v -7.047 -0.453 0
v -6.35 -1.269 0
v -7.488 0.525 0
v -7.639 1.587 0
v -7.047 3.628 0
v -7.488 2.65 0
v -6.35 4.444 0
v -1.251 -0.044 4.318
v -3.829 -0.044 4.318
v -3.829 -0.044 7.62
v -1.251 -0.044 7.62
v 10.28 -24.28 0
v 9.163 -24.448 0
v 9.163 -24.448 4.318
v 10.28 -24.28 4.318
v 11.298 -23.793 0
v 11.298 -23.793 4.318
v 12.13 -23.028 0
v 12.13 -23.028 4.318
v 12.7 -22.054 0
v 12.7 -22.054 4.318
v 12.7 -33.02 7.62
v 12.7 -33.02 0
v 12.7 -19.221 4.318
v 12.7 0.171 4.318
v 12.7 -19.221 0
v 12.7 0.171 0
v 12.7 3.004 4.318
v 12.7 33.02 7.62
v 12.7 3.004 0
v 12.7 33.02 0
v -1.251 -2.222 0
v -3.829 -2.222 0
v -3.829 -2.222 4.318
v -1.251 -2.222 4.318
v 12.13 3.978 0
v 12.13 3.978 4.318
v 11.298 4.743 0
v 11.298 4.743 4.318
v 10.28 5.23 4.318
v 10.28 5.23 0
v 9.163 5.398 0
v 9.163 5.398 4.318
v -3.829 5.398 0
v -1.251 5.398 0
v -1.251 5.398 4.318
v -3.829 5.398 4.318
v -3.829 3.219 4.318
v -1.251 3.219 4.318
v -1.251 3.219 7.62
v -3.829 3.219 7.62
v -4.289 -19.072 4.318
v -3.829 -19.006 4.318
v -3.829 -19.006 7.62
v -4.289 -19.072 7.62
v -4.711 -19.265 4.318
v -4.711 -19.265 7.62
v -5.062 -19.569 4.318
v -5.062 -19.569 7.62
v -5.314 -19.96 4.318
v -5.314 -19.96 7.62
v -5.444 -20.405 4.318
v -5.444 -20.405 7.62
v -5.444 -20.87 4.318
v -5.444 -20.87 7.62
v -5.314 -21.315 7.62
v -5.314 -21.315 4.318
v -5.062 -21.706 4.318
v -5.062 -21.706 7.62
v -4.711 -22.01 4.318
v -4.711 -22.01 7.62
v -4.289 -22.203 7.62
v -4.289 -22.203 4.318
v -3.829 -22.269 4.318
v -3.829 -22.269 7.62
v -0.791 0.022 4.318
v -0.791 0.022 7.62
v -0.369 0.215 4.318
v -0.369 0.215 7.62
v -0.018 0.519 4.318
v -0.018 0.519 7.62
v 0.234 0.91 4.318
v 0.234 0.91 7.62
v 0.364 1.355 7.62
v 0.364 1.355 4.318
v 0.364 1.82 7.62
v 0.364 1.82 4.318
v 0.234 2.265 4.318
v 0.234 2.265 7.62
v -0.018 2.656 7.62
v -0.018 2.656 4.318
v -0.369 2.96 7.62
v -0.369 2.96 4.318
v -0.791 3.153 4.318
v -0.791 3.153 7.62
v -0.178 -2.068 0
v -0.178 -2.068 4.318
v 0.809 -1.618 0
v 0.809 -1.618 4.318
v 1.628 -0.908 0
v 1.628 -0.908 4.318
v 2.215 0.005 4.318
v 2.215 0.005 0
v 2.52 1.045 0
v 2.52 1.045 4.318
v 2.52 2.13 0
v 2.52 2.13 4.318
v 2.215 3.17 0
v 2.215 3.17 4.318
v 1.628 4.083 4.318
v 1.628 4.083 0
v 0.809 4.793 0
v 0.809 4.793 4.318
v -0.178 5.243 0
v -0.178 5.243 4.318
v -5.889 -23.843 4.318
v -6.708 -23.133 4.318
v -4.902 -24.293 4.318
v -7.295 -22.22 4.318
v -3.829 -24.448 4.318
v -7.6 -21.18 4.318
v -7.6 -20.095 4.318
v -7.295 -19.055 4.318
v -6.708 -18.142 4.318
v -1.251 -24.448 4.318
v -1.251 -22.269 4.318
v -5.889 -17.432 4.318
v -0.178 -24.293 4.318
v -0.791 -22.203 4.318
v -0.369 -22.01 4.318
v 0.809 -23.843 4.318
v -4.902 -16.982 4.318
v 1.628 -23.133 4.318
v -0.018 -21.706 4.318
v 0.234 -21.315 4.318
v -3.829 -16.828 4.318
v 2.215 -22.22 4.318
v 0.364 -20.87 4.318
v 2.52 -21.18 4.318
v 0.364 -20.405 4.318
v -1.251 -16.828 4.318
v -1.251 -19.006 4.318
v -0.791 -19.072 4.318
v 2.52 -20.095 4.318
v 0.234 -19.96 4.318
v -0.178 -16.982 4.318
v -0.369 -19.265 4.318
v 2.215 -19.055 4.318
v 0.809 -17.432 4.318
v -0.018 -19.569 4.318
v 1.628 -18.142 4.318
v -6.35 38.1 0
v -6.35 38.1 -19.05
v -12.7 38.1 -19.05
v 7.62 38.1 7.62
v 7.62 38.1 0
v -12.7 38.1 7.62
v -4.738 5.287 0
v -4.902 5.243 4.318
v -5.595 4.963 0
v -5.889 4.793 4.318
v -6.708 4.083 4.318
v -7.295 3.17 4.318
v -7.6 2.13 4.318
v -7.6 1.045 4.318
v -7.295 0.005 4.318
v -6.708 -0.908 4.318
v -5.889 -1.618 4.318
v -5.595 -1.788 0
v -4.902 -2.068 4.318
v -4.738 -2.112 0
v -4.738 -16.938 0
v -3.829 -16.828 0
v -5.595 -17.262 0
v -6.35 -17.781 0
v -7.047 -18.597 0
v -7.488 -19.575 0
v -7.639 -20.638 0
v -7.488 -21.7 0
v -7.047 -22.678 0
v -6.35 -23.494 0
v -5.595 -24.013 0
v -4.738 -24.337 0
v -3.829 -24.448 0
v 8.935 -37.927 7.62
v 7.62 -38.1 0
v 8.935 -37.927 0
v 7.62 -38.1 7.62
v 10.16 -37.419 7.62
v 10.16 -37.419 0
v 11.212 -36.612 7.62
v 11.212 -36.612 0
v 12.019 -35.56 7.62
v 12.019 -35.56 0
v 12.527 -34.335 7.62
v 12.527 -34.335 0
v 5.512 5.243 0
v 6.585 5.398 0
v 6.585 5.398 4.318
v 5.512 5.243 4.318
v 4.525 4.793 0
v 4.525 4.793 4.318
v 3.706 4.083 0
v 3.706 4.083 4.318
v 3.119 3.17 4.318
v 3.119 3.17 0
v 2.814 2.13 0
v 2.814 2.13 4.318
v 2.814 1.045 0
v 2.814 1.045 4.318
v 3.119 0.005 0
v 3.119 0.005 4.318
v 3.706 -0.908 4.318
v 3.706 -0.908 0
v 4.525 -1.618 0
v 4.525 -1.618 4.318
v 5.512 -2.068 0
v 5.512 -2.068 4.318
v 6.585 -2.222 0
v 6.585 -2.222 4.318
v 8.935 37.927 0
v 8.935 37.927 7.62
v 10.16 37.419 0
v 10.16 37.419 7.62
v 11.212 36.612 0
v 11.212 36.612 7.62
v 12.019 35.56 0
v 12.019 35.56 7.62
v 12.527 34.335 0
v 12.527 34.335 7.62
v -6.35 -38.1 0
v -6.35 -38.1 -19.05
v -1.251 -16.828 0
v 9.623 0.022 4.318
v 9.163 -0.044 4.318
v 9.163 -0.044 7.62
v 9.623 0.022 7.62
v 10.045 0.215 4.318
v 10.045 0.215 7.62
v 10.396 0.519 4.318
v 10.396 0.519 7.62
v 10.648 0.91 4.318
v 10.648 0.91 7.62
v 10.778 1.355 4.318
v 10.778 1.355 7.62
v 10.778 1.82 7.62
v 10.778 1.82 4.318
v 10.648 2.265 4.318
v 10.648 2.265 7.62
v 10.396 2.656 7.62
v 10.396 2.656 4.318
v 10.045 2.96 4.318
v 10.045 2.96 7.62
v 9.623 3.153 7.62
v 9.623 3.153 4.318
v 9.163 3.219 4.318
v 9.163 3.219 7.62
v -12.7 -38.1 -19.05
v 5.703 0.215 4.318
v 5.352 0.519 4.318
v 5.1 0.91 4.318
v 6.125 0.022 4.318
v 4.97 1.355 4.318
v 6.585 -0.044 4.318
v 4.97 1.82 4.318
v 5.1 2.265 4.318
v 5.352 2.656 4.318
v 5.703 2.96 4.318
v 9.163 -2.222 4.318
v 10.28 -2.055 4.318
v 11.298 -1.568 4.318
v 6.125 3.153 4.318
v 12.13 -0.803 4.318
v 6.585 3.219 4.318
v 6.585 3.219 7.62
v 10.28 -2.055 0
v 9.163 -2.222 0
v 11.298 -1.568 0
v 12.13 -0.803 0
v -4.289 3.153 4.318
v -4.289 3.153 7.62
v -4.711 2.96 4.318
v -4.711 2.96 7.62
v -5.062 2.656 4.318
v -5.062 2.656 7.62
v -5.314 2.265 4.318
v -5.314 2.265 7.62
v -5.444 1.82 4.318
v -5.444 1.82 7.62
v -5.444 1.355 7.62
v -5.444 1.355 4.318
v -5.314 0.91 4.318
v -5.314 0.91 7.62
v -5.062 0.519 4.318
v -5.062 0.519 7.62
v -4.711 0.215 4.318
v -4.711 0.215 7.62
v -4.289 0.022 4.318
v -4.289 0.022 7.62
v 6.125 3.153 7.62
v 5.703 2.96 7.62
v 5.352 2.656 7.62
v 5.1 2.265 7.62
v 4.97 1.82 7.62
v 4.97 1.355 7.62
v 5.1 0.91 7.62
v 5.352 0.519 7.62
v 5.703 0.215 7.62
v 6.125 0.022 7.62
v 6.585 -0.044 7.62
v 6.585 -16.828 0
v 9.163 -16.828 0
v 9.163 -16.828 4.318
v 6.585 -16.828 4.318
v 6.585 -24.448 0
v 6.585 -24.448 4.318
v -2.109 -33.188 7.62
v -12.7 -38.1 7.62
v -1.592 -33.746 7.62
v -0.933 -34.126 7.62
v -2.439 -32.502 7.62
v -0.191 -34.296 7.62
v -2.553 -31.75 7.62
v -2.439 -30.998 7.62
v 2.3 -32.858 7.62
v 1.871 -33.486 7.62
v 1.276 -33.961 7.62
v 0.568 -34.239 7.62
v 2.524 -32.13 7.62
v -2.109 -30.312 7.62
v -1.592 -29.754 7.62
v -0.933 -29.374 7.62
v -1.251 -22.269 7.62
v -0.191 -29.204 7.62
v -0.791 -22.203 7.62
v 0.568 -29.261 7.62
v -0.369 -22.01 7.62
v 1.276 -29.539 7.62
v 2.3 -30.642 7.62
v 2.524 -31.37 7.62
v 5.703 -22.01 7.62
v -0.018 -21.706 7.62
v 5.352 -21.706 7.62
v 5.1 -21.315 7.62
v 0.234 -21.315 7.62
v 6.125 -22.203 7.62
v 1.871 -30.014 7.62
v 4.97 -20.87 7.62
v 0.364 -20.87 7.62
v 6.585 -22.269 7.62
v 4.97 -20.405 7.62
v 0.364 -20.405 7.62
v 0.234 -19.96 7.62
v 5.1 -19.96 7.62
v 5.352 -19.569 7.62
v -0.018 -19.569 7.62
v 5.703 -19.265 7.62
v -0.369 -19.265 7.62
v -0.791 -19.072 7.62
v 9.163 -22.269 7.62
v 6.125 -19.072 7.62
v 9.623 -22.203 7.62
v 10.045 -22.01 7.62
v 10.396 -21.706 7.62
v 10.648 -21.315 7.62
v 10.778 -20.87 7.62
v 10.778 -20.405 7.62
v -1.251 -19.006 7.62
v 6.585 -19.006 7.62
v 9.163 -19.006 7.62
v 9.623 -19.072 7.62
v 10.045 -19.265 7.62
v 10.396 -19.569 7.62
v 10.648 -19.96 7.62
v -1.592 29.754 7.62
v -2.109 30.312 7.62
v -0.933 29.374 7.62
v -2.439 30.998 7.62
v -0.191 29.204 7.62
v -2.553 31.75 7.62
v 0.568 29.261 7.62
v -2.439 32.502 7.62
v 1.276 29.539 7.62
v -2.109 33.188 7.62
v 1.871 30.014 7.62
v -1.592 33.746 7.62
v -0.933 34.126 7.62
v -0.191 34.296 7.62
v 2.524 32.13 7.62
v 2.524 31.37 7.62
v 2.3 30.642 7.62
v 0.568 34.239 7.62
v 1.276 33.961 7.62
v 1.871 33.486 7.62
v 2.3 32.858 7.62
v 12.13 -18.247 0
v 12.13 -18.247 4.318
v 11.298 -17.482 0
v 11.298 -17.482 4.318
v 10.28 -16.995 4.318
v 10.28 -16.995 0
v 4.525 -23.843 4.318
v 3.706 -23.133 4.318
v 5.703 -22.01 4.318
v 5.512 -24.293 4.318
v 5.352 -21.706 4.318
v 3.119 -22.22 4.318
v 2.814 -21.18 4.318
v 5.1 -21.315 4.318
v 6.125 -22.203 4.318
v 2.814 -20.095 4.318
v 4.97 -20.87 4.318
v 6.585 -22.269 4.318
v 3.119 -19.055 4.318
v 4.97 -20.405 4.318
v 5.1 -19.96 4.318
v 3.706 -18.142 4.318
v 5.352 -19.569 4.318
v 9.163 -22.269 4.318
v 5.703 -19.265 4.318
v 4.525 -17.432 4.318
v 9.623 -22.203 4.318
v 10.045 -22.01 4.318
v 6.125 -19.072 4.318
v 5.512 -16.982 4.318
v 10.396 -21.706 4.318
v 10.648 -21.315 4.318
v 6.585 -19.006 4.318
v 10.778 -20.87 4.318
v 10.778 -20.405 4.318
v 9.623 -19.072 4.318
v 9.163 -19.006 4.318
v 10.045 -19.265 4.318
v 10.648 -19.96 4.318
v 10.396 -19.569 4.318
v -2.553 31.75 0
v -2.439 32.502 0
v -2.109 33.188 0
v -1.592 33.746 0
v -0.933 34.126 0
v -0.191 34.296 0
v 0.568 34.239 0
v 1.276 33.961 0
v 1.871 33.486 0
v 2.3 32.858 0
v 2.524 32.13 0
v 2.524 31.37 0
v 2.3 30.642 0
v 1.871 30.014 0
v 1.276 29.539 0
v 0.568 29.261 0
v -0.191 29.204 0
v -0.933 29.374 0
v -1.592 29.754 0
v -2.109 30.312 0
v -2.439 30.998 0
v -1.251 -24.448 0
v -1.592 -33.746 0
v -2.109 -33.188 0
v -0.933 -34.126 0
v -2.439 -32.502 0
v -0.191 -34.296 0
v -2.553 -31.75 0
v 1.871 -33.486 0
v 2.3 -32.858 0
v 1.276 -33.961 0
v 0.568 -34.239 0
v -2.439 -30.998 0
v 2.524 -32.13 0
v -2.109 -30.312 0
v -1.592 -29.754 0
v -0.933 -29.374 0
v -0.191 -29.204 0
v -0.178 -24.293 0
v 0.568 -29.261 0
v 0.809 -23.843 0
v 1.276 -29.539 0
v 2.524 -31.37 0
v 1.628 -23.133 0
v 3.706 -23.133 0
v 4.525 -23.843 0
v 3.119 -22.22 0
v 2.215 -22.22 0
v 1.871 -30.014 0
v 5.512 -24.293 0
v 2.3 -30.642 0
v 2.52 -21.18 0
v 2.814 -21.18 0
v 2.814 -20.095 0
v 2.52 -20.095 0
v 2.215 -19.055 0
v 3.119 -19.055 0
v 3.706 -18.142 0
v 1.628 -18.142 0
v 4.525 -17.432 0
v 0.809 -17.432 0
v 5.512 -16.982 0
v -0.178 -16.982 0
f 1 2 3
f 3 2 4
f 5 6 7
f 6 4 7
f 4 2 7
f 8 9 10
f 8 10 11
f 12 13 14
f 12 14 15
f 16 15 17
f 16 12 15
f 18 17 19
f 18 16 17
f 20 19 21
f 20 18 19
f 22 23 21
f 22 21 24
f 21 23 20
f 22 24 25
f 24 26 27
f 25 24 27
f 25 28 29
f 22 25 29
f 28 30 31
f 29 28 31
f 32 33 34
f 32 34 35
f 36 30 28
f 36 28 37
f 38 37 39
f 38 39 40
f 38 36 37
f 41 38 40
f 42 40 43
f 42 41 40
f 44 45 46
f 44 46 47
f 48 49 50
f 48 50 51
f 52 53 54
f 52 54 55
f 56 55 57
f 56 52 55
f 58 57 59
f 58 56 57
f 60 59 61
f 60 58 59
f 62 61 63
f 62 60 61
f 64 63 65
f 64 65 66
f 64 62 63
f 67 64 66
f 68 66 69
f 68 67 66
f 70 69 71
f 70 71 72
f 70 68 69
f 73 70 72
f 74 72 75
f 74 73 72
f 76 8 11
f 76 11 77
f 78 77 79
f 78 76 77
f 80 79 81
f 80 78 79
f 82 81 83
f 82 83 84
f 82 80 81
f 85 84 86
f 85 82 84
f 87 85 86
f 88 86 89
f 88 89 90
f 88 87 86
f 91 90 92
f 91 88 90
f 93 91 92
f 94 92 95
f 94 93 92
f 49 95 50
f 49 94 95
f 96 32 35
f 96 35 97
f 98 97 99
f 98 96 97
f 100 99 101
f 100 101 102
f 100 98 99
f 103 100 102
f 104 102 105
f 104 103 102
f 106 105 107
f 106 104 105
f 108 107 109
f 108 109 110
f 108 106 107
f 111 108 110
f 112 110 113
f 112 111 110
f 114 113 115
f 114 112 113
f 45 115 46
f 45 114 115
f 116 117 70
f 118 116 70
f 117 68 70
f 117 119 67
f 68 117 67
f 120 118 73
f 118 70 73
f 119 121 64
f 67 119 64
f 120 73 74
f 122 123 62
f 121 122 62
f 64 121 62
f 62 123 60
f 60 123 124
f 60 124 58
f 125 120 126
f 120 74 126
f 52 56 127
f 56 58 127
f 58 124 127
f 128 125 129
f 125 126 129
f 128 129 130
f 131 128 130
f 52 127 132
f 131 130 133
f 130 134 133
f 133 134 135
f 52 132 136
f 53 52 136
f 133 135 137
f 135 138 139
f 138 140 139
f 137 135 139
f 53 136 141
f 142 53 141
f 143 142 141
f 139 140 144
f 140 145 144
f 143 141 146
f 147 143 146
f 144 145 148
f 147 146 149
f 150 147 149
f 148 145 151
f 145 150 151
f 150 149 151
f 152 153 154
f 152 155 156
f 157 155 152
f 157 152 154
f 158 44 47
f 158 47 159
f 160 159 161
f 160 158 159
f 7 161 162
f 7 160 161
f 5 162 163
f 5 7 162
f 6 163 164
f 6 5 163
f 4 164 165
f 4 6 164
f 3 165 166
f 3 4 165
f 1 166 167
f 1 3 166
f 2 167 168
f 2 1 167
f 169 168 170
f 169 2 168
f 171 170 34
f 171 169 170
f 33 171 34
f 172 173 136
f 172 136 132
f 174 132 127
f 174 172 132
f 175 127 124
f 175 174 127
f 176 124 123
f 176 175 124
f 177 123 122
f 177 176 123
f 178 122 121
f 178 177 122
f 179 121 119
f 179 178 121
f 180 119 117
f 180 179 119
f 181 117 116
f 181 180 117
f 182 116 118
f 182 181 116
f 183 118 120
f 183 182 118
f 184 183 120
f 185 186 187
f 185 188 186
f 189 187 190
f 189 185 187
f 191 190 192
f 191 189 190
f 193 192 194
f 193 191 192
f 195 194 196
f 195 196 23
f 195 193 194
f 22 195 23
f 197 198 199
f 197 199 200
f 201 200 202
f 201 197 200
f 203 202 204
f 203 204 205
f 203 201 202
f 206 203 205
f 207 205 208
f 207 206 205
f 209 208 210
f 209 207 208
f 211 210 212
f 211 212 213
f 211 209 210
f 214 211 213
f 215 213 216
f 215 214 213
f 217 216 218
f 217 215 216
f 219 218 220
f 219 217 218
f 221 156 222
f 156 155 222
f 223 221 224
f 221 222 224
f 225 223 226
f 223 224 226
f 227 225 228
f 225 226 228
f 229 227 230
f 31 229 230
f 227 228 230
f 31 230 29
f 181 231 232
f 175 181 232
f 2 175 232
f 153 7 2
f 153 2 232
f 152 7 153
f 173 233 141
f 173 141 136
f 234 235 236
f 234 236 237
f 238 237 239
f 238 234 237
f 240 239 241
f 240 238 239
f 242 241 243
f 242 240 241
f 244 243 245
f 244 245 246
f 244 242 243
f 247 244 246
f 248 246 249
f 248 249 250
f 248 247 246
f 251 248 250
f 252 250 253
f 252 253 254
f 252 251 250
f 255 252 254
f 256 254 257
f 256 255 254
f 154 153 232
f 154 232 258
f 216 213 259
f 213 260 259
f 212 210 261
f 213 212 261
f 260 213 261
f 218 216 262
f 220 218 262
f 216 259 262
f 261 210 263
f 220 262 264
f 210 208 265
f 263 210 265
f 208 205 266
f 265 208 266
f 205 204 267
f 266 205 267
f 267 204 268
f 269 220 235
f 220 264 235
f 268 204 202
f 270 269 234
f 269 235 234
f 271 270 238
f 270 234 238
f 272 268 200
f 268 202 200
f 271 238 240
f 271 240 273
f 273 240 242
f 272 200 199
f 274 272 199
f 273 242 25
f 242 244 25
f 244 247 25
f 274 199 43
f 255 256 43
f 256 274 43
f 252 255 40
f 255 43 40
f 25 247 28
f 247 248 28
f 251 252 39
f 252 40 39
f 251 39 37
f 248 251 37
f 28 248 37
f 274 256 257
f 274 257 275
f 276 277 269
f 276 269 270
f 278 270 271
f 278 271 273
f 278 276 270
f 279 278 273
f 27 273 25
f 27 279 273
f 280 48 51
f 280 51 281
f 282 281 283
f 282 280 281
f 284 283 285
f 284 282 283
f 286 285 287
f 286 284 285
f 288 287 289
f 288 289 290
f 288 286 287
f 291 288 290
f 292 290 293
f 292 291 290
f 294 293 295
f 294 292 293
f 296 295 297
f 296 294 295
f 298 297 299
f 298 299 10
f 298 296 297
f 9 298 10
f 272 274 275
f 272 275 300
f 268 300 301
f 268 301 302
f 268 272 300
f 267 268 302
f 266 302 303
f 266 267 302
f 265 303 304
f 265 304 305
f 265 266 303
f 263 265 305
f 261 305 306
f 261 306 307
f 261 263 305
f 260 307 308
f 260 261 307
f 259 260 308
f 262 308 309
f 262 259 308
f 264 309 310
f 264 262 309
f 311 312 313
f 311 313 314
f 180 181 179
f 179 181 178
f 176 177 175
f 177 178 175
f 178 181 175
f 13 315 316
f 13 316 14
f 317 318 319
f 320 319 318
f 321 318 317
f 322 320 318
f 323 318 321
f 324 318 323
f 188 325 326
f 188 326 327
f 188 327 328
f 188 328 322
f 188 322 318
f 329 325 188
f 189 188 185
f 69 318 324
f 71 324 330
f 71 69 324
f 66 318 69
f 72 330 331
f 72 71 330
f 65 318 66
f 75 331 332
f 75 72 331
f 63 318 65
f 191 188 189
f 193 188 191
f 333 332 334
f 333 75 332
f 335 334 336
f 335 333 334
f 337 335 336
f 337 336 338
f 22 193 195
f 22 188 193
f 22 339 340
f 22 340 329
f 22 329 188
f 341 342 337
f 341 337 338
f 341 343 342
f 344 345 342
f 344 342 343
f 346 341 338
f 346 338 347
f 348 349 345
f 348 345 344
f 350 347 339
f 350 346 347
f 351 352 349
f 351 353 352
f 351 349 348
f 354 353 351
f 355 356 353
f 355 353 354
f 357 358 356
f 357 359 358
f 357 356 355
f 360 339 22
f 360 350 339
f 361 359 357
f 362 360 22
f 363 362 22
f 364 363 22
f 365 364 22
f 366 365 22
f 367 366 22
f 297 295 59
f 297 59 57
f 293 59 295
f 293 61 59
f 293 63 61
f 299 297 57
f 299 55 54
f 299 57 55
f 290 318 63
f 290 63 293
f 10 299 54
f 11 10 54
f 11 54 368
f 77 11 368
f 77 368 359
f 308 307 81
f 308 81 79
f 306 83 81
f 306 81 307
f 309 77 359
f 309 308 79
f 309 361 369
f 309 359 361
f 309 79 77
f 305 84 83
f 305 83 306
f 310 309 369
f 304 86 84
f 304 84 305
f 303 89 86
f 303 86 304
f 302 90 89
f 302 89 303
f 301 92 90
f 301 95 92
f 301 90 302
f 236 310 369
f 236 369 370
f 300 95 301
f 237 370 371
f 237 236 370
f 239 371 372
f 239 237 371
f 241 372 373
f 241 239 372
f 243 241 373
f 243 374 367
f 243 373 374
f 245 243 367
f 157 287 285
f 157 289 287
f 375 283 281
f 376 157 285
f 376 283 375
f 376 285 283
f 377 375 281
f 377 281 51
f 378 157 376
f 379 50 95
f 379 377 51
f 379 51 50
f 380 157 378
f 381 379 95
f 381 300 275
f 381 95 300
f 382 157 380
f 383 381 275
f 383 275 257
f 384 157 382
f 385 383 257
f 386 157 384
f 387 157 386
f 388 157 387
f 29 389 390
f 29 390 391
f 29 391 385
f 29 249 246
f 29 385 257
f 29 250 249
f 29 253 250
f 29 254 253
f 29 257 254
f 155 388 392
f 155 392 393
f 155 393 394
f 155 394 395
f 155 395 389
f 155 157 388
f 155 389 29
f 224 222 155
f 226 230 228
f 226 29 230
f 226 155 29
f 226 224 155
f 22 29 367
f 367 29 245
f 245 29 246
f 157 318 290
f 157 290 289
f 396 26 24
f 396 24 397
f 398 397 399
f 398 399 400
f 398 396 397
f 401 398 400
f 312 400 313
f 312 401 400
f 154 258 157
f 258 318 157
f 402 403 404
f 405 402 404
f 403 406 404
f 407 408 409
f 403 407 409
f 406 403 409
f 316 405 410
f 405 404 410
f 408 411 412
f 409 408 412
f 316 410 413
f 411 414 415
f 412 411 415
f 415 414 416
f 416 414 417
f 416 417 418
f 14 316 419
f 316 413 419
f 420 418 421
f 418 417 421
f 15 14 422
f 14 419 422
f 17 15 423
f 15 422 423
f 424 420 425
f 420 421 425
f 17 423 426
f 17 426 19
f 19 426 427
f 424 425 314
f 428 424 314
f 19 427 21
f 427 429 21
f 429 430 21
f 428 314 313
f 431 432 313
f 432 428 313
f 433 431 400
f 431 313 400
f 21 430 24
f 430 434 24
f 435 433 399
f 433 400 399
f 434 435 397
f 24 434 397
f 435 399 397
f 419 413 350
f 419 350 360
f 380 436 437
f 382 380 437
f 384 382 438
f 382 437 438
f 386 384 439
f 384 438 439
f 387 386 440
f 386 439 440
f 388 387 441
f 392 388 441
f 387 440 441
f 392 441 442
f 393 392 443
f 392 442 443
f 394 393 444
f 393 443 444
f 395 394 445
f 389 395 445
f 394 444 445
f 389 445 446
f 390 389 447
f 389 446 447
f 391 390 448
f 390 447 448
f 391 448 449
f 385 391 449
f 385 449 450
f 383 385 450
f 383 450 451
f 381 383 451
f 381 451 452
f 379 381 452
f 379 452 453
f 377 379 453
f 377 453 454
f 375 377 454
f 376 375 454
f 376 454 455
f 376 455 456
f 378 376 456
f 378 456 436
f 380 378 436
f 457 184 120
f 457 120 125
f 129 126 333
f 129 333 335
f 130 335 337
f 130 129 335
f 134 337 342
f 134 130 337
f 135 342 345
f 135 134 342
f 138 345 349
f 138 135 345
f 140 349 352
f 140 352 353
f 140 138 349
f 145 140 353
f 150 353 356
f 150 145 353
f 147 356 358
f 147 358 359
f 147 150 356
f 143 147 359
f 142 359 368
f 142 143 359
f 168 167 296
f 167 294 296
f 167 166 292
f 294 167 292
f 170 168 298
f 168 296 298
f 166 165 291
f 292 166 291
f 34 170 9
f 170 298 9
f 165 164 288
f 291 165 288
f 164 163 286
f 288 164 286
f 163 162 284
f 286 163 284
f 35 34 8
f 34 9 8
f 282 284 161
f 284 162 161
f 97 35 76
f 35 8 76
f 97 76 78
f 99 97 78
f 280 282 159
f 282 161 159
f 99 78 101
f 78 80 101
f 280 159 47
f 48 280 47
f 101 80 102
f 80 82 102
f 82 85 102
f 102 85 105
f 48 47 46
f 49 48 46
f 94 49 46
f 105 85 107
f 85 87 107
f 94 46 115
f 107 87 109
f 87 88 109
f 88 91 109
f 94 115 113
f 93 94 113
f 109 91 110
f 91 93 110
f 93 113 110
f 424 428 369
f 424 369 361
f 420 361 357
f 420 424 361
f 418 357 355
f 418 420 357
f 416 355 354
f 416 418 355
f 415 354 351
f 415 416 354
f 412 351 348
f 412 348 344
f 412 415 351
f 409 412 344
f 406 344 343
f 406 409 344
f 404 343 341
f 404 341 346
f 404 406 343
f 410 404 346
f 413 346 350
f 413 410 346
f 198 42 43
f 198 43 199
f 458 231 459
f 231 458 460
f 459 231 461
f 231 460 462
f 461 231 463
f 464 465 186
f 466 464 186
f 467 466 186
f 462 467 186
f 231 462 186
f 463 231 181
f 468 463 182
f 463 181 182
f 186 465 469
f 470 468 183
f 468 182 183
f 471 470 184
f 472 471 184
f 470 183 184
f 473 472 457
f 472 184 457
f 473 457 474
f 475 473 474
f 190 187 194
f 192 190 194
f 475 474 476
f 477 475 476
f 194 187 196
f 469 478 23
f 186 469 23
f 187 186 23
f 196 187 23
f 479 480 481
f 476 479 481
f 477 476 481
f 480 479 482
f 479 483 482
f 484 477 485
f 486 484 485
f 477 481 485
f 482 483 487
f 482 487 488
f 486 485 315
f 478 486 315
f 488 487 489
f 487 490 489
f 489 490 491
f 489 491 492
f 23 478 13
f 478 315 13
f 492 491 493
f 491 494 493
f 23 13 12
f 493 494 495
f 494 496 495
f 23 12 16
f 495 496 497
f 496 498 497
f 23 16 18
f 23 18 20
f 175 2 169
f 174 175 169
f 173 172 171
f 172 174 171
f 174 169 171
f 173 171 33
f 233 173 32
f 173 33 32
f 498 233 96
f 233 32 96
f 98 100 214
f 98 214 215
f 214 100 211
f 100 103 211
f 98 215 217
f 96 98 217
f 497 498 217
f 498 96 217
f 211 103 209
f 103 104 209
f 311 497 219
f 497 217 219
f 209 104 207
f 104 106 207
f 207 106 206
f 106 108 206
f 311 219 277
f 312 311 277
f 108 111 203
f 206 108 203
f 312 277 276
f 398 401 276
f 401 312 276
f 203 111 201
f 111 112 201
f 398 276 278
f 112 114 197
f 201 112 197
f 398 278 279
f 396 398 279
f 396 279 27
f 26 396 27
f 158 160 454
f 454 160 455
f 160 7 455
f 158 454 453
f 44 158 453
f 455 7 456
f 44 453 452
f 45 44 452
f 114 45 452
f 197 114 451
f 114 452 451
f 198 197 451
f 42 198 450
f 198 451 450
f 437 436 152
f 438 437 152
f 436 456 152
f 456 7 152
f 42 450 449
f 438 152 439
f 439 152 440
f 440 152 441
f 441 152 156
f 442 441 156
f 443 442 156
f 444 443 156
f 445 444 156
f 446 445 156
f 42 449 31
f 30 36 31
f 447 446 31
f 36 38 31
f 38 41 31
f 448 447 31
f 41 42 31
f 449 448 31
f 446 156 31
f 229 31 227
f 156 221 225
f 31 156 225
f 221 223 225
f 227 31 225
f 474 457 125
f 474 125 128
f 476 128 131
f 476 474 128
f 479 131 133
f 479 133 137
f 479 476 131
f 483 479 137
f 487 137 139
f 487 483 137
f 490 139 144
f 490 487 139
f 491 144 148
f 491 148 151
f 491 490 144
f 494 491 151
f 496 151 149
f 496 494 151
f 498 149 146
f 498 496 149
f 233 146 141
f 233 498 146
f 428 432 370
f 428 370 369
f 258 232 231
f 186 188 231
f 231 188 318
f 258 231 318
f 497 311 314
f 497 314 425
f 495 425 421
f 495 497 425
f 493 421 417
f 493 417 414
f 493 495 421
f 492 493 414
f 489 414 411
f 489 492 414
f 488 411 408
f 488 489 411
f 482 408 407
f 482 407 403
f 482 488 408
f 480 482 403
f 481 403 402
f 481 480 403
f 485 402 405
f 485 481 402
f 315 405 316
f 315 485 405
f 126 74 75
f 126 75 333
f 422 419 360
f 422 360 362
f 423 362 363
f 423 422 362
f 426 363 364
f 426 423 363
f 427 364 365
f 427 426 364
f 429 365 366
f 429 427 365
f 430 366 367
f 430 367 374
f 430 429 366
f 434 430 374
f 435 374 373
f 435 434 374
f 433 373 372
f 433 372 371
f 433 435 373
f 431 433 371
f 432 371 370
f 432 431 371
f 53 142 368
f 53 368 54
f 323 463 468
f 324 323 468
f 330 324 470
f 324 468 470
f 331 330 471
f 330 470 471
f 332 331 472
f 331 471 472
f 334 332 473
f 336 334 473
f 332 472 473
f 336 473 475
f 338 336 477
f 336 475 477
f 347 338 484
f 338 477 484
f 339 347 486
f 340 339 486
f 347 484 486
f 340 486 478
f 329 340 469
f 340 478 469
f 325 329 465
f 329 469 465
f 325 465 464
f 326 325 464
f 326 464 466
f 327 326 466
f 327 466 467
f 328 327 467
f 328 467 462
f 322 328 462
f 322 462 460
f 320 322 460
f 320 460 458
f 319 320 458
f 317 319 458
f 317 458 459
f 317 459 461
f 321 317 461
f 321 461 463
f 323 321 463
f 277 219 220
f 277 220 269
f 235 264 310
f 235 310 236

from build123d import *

# Parameters (mm, degrees)
SKETCH1_W                                     = 25.4
SKETCH1_H                                     = 76.2
BOSS_EXTRUDE1_DEPTH                           = 7.62
F_10_CLEARANCE_HOLE1_D                        = 5.1054
F_10_CLEARANCE_HOLE1_DEPTH                    = 25.4
F_10_CLEARANCE_HOLE1_TIP                      = 1.533816902
CBORE_SLOT_FOR_4_SOCKET_HEAD_CAP_SCREW1_DEPTH = 4.318
CBORE_START                                   = 4.318
CBORE_SLOT_FOR_4_SOCKET_HEAD_CAP_SC_3_DEPTH   = 3.302
FILLET1_R                                     = 5.08
SKETCH8_W                                     = 6.35
SKETCH8_H                                     = 76.2
BOSS_EXTRUDE2_DEPTH                           = 19.05


# Read off the part's stored shape, not the designer's step: CBORE SLOT for #4 Socket Head Cap Screw1
with BuildPart() as part:
    # Sketch1 → Boss-Extrude1 (new body)
    with BuildSketch(Plane.XY):
        Rectangle(SKETCH1_W, SKETCH1_H)
    extrude(amount=BOSS_EXTRUDE1_DEPTH)

    # #10 Clearance Hole1
    with Locations(Plane.XY.offset(7.62)):
        with Locations((0, 31.75), (0, -31.75)):
            Hole(F_10_CLEARANCE_HOLE1_D / 2, depth=F_10_CLEARANCE_HOLE1_DEPTH)
            with Locations((0, 0, -(F_10_CLEARANCE_HOLE1_DEPTH + F_10_CLEARANCE_HOLE1_TIP / 2))):  # 118° drill point
                Cone(0, F_10_CLEARANCE_HOLE1_D / 2, F_10_CLEARANCE_HOLE1_TIP, mode=Mode.SUBTRACT)

    # CBORE SLOT for _4 Socket Head Cap Sc 2 → CBORE SLOT for #4 Socket Head Cap Screw1 (cut)
    with BuildSketch(Plane.XY):
        with BuildLine():
            Line((12.7, -22.053863194), (12.7, -19.221136806))
            ThreePointArc((12.7, -19.221136806), (11.298437111, -17.48215186), (9.16305, -16.8275))
            Line((9.16305, -16.8275), (6.58495, -16.8275))
            ThreePointArc((6.58495, -16.8275), (2.77495, -20.6375), (6.58495, -24.4475))
            Line((6.58495, -24.4475), (9.16305, -24.4475))
            ThreePointArc((9.16305, -24.4475), (11.298437111, -23.79284814), (12.7, -22.053863194))
        make_face()
        with BuildLine():
            ThreePointArc((12.7, 3.003863194), (11.298437111, 4.74284814), (9.16305, 5.3975))
            Line((9.16305, 5.3975), (6.58495, 5.3975))
            ThreePointArc((6.58495, 5.3975), (2.77495, 1.5875), (6.58495, -2.2225))
            Line((6.58495, -2.2225), (9.16305, -2.2225))
            ThreePointArc((9.16305, -2.2225), (11.298437111, -1.56784814), (12.7, 0.171136806))
            Line((12.7, 0.171136806), (12.7, 3.003863194))
        make_face()
        with BuildLine():
            ThreePointArc((-3.82905, 5.3975), (-7.63905, 1.5875), (-3.82905, -2.2225))
            Line((-3.82905, -2.2225), (-1.25095, -2.2225))
            ThreePointArc((-1.25095, -2.2225), (2.55905, 1.5875), (-1.25095, 5.3975))
            Line((-1.25095, 5.3975), (-3.82905, 5.3975))
        make_face()
        with BuildLine():
            ThreePointArc((-3.82905, -16.8275), (-7.63905, -20.6375), (-3.82905, -24.4475))
            Line((-3.82905, -24.4475), (-1.25095, -24.4475))
            ThreePointArc((-1.25095, -24.4475), (2.55905, -20.6375), (-1.25095, -16.8275))
            Line((-1.25095, -16.8275), (-3.82905, -16.8275))
        make_face()
    extrude(amount=CBORE_SLOT_FOR_4_SOCKET_HEAD_CAP_SCREW1_DEPTH, mode=Mode.SUBTRACT)

    # CBORE SLOT for _4 Socket Head Cap Sc 3 o → CBORE SLOT for _4 Socket Head Cap Sc 3 (cut)
    with BuildSketch(Plane.XY.offset(CBORE_START)):
        with BuildLine():
            ThreePointArc((9.16305, -0.04445), (10.795, 1.5875), (9.16305, 3.21945))
            Line((9.16305, 3.21945), (6.58495, 3.21945))
            ThreePointArc((6.58495, 3.21945), (4.953, 1.5875), (6.58495, -0.04445))
            Line((6.58495, -0.04445), (9.16305, -0.04445))
        make_face()
        with BuildLine():
            ThreePointArc((-3.82905, 3.21945), (-5.461, 1.5875), (-3.82905, -0.04445))
            Line((-3.82905, -0.04445), (-1.25095, -0.04445))
            ThreePointArc((-1.25095, -0.04445), (0.381, 1.5875), (-1.25095, 3.21945))
            Line((-1.25095, 3.21945), (-3.82905, 3.21945))
        make_face()
        with BuildLine():
            ThreePointArc((9.16305, -22.26945), (10.795, -20.6375), (9.16305, -19.00555))
            Line((9.16305, -19.00555), (6.58495, -19.00555))
            ThreePointArc((6.58495, -19.00555), (4.953, -20.6375), (6.58495, -22.26945))
            Line((6.58495, -22.26945), (9.16305, -22.26945))
        make_face()
        with BuildLine():
            ThreePointArc((-3.82905, -19.00555), (-5.461, -20.6375), (-3.82905, -22.26945))
            Line((-3.82905, -22.26945), (-1.25095, -22.26945))
            ThreePointArc((-1.25095, -22.26945), (0.381, -20.6375), (-1.25095, -19.00555))
            Line((-1.25095, -19.00555), (-3.82905, -19.00555))
        make_face()
    extrude(amount=CBORE_SLOT_FOR_4_SOCKET_HEAD_CAP_SC_3_DEPTH, mode=Mode.SUBTRACT)

    # Fillet1
    fillet1_edges = [part.edges().sort_by_distance(p)[0] for p in [
        (12.7, 38.1, 3.81),
        (12.7, -38.1, 3.81),
    ]]
    fillet(fillet1_edges, radius=FILLET1_R)

    # Sketch8 → Boss-Extrude2 (add)
    with BuildSketch(Plane(origin=(0, 0, 0), x_dir=(-1, 0, 0), z_dir=(0, 0, -1))):
        with Locations((9.525, 0)):
            Rectangle(SKETCH8_W, SKETCH8_H)
    extrude(amount=BOSS_EXTRUDE2_DEPTH)


solid = part.part
